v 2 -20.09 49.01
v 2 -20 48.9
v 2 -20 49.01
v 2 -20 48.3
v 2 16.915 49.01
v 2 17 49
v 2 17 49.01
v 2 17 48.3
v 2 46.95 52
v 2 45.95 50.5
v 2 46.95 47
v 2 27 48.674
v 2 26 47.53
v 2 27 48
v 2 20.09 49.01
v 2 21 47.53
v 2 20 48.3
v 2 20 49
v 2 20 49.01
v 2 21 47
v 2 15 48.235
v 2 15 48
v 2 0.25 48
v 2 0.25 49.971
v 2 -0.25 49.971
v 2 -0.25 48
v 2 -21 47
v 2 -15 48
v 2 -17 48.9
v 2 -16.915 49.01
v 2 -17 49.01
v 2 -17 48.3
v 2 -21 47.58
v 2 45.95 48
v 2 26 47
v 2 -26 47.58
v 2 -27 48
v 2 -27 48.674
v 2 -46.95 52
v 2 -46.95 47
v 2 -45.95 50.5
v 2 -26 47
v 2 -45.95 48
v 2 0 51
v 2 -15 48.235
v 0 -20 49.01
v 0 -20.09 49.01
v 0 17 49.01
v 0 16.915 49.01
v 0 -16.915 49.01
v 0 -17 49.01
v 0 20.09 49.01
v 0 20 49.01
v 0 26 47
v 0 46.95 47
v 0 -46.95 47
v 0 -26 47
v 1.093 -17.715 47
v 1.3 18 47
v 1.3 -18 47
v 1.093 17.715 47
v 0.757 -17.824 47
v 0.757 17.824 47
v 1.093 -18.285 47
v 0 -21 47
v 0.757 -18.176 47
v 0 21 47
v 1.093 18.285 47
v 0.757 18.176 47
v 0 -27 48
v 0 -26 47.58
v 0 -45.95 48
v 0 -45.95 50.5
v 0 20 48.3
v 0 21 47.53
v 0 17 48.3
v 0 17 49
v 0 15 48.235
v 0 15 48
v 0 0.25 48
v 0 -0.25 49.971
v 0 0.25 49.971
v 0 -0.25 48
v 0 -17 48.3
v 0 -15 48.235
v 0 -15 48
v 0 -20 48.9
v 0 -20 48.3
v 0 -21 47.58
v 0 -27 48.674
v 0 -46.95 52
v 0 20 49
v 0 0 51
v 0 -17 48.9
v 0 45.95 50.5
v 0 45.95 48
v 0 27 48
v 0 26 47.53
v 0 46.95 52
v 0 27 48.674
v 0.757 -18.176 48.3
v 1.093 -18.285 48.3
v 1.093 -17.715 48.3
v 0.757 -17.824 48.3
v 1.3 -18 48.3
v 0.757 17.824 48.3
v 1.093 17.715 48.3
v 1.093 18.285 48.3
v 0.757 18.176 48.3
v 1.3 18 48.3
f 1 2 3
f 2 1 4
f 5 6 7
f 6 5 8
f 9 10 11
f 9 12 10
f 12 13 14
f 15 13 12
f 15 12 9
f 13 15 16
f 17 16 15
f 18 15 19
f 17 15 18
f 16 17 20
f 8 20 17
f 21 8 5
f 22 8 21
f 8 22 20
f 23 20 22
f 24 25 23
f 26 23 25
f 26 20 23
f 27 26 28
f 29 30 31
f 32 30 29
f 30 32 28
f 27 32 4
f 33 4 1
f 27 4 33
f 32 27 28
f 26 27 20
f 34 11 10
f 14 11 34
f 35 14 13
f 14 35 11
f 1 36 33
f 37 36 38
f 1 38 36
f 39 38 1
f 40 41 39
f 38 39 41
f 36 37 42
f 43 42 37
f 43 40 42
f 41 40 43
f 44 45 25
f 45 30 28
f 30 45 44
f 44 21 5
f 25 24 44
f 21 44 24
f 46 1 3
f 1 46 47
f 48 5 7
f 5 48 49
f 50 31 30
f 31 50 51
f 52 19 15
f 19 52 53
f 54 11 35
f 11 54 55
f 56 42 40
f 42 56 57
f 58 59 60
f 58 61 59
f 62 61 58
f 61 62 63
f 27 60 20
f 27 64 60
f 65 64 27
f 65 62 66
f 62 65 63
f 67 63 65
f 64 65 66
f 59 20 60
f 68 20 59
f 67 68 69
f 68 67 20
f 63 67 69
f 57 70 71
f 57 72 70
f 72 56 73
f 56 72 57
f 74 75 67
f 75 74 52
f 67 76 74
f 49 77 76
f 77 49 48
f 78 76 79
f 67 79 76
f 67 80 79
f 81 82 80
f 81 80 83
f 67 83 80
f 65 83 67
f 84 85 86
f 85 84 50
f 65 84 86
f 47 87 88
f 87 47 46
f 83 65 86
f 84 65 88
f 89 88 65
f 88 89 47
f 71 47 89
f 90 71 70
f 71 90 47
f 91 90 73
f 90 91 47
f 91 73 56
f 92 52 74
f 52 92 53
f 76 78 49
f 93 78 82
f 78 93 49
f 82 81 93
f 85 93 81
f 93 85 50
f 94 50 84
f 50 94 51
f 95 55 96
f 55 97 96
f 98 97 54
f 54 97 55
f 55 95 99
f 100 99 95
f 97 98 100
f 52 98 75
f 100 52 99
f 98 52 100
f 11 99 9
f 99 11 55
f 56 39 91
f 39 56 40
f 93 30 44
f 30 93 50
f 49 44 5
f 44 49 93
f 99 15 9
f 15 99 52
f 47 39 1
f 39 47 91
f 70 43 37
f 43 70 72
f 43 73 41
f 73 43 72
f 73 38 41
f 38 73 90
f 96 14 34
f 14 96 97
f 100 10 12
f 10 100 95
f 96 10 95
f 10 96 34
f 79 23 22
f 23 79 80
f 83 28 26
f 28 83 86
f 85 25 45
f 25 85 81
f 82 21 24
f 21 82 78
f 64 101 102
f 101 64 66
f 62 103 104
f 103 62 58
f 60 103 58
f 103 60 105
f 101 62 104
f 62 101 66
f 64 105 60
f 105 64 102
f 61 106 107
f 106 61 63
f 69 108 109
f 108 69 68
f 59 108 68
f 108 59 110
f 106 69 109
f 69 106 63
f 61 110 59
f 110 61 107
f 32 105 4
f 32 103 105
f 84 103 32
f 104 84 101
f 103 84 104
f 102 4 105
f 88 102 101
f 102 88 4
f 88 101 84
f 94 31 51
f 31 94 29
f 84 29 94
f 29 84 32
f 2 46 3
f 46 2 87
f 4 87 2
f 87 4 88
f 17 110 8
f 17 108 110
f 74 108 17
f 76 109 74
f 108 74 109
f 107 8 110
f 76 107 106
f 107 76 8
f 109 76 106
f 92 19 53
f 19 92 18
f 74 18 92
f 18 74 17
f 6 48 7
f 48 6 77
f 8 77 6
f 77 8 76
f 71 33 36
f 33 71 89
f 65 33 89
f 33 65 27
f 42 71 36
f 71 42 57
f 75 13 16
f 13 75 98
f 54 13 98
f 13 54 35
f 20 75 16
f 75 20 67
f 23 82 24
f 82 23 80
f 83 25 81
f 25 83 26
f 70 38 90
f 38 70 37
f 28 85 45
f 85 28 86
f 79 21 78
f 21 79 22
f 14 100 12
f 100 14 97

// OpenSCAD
// file: mod_prism.scad
/// @file mod_prism.scad
///
/// @author © Dave Harris 2022
///

// points   1        ^
//        / | \      |
//       /  4  \     h
//      /  / \  \    |
//     0--/---\--2   v
//   w | /     \ | 
//     3---------5
//     <lLH><lRH>


module prism(h=20, lLH=15, lRH=25, w=1)
{
 polyhedron(
  points=[
   [0, 0, 0]       // 0 back LH corner
  ,[lLH, h, 0]     // 1 back peak
  ,[lLH+lRH, 0, 0] // 2 back RH corner
  ,[0, 0, w]       // 3 front LH corner
  ,[lLH, h, w]     // 4 front peak
  ,[lLH+lRH, 0, w] // 5 front RH corner
  ]
  , faces=[
    [0, 3, 5, 2] // bottom
   ,[0, 1, 4, 3] // LH ramp
   ,[1, 2, 5, 4] // RH ramp 
   ,[2, 1, 0]    // back wall
   ,[3, 4, 5]    // front wall
   ]
 );
} // end of module prism()

// local test prism
prism(lLH=1, lRH= 22, h=18, w=1 );

// eof
// file: fb_globals.scad
/// @file fb_globals.scad
///
/// @brief project footbridge globals
///
/// @author © Dave Harris 2022
///
/// Included in all project files.


$fa = 1;   // Fragment angle
$fs = 0.4; // Fragment size resolution

// global constants
//------------------

H_canopy = 47;

H_bridge = 49.5; // platform<>bridge
W_bridge = 36;   // width of bridge
                 // > walkway
W_walk   = 34.5; // width
H_walk   = 36;   // height of walkway


Steps    = 27;   // number of steps
W_stairs = 32;   // width ~ 9'6" @ H0
L_tread  = 3.5;  // tread ~ 12" @ H0
L_stairs = L_tread * (Steps +1);
H_rise   = H_bridge / (Steps +1); 
  // rise is 1.7678, not H0 1.75 (6")

W_lift   = 34;

W_build  = W_stairs +2;
L_build  = L_stairs+W_bridge+W_lift +2;

W_pillar = 4;

L_spacing = L_build /2;

Spans = 6;

L_canopy = ((Spans -1) * L_spacing) + W_pillar;

echo("len",L_canopy);

H_door   = 28;
W_door   = 18;

H_window = 6;
W_window = 16;


W_plat45  = 93.9;
W_track34 = 87.9;
W_plat23  = 93.8;
W_track12 = 87.9;

W_plat23edge =
   ( W_plat23 - W_stairs +2 ) /2 ;
W_plat45edge =
   ( W_plat45 - W_stairs +2 ) /2 ;
   
L_span34 = W_track34 + W_plat45edge + W_plat23edge;

L_span12 = 136.5;

W_grider = 2.2;

W_LEDstrip = 7.5;



// eof
// main file
/// @file fb_canopyspan.scad
///
/// @brief platform canopy span
///
/// @author © Dave Harris 2022
/// 




include<fb_globals.scad>

use<mod_prism.scad>


canopySpan(
            Xpos = 0
            , Wplat = W_plat45
            , Wcenter = W_build
);



// a full width canopy span
//--------------------------

module canopySpan(
          , Xpos
          , Wplat
          , Wcenter
          , Wgully = 3
       )
{
  difference()
  {
    union()
    {
      translate( // cross member
        [ Xpos
        , - (W_plat45 /2)
        , H_canopy  ]
      ) cube(
         [ 2
         , W_plat45
         , 2.01 ] 
        );
      
      translate( // central pitch
        [ Xpos
        , -(Wcenter /2)
        , H_canopy +2 ] 
      ) rotate(
         [ 90
         , 0
         , 90  ]
        ) prism(
            h = 2
          , lLH = (Wcenter /2)
          , lRH = (Wcenter /2)
          , w = 2
         );

      translate( // offside pitch
        [ Xpos
        , (Wcenter /2) +Wgully
        , H_canopy +2 ] 
      ) rotate(
         [ 90
         , 0
         , 90  ]
        ) prism(
           h = 3
           , lLH =
          ((Wplat-Wcenter)/2) -Wgully
          , lRH = 0
          , w = 2
         );
      
      translate( // nearside pitch
        [ Xpos
        , -(Wplat /2)
        , H_canopy +2 ] 
      ) rotate(
         [ 90
         , 0
         , 90  ]
        ) prism(
          h = 3
          , lRH =
          ((Wplat-Wcenter)/2) -Wgully
          , lLH = 0
          , w = 2
         );
    } // end union
 
    translate( // hollow nearside
        [ Xpos -0.01
        , -(Wplat /2) +1
        , H_canopy +1 ] 
    ) rotate(
         [ 90
         , 0
         , 90  ]
      ) prism(
         h = 2.5
       , lRH =
        ((Wplat-Wcenter)/2) -Wgully -1
       , lLH = 0
       , w = 2.5
        ); 
  
    translate( // hollow offside
        [ Xpos -0.01
        , (Wcenter /2) +Wgully
        , H_canopy +1 ] 
    ) rotate(
         [ 90
         , 0
         , 90  ]
      ) prism(
         h = 2.5
       , lLH =
        ((Wplat-Wcenter)/2) -Wgully -1
       , lRH = 0
       , w = 2.5
       );
       
    translate( // hollow central
        [ Xpos -0.1
        , -(Wcenter /2)
        , H_canopy + 1 ] 
    ) rotate(
         [ 90
         , 0
         , 90  ]
      ) prism(
           h = 2
         , lLH = (Wcenter /2) 
         , lRH = (Wcenter /2)
         , w = 2.5
        );
        
    translate( // vert hole nearside
      [ Xpos +1
      , - (W_build /2) -1
      , H_canopy -1 ]
    ) cylinder(
         h = 3
       , r = 0.3 
      );

    translate( // vert hole offside
      [ Xpos +1
      , (W_build /2) +1
      , H_canopy -1 ]
    ) cylinder(
         h = 3
       , r = 0.3 
      );

    translate( // hollow nearside gully
      [ Xpos -1
      , - (W_build /2) -3
      , H_canopy +1.3 ]
    ) cube(
        [ 5
        , 3
        , 1.0  ] 
      );

    translate( // hollow offside gully
      [ Xpos -1
      , (W_build /2) 
      , H_canopy +1.3  ]
    ) cube(
        [ 5
        , 3
        , 1.0 ] 
      );
      
    translate( // light support
      [ Xpos -0.8
      , - (W_build /2) - 9
      , H_canopy -0.02  ]
    ) cube(
        [ 3 ,5, 0.6 ]
      );
    
    translate( // light support
      [ Xpos -0.8
      , (W_build /2) +4
      , H_canopy -0.02  ]
    ) cube(
        [ 3 ,5, 0.55 ]
      );
    
  } // end difference  
  
    translate( // central upright
      [ Xpos
      , -0.25
      , H_canopy  ]
    ) cube(
      [ 2
      , 0.5
      , 3.2 ] 
      );

    translate( //fill nearside accute
      [ Xpos 
      , - (Wcenter /2) -10
      , H_canopy +0.8 ]
    ) cube(
        [ 2, 7, 1.1 ]
      ); 
    translate( //fill nearside accute
      [ Xpos
      , - (Wcenter /2)
      , H_canopy +0.8 ]
    ) cube(
        [ 2, 2, 1.1 ]
      ); 
      
    translate( //fill offside accute
      [ Xpos
      , (Wcenter /2) -2
      , H_canopy +0.8 ]
    ) cube(
        [ 2, 2, 1.2 ]
      ); 
    translate( //fill offside accute
      [ Xpos
      , (Wcenter /2) +3
      , H_canopy +0.9  ]
    ) cube(
        [ 2, 7, 1.1  ]
      ); 

} // end module canopySpan


// eof
